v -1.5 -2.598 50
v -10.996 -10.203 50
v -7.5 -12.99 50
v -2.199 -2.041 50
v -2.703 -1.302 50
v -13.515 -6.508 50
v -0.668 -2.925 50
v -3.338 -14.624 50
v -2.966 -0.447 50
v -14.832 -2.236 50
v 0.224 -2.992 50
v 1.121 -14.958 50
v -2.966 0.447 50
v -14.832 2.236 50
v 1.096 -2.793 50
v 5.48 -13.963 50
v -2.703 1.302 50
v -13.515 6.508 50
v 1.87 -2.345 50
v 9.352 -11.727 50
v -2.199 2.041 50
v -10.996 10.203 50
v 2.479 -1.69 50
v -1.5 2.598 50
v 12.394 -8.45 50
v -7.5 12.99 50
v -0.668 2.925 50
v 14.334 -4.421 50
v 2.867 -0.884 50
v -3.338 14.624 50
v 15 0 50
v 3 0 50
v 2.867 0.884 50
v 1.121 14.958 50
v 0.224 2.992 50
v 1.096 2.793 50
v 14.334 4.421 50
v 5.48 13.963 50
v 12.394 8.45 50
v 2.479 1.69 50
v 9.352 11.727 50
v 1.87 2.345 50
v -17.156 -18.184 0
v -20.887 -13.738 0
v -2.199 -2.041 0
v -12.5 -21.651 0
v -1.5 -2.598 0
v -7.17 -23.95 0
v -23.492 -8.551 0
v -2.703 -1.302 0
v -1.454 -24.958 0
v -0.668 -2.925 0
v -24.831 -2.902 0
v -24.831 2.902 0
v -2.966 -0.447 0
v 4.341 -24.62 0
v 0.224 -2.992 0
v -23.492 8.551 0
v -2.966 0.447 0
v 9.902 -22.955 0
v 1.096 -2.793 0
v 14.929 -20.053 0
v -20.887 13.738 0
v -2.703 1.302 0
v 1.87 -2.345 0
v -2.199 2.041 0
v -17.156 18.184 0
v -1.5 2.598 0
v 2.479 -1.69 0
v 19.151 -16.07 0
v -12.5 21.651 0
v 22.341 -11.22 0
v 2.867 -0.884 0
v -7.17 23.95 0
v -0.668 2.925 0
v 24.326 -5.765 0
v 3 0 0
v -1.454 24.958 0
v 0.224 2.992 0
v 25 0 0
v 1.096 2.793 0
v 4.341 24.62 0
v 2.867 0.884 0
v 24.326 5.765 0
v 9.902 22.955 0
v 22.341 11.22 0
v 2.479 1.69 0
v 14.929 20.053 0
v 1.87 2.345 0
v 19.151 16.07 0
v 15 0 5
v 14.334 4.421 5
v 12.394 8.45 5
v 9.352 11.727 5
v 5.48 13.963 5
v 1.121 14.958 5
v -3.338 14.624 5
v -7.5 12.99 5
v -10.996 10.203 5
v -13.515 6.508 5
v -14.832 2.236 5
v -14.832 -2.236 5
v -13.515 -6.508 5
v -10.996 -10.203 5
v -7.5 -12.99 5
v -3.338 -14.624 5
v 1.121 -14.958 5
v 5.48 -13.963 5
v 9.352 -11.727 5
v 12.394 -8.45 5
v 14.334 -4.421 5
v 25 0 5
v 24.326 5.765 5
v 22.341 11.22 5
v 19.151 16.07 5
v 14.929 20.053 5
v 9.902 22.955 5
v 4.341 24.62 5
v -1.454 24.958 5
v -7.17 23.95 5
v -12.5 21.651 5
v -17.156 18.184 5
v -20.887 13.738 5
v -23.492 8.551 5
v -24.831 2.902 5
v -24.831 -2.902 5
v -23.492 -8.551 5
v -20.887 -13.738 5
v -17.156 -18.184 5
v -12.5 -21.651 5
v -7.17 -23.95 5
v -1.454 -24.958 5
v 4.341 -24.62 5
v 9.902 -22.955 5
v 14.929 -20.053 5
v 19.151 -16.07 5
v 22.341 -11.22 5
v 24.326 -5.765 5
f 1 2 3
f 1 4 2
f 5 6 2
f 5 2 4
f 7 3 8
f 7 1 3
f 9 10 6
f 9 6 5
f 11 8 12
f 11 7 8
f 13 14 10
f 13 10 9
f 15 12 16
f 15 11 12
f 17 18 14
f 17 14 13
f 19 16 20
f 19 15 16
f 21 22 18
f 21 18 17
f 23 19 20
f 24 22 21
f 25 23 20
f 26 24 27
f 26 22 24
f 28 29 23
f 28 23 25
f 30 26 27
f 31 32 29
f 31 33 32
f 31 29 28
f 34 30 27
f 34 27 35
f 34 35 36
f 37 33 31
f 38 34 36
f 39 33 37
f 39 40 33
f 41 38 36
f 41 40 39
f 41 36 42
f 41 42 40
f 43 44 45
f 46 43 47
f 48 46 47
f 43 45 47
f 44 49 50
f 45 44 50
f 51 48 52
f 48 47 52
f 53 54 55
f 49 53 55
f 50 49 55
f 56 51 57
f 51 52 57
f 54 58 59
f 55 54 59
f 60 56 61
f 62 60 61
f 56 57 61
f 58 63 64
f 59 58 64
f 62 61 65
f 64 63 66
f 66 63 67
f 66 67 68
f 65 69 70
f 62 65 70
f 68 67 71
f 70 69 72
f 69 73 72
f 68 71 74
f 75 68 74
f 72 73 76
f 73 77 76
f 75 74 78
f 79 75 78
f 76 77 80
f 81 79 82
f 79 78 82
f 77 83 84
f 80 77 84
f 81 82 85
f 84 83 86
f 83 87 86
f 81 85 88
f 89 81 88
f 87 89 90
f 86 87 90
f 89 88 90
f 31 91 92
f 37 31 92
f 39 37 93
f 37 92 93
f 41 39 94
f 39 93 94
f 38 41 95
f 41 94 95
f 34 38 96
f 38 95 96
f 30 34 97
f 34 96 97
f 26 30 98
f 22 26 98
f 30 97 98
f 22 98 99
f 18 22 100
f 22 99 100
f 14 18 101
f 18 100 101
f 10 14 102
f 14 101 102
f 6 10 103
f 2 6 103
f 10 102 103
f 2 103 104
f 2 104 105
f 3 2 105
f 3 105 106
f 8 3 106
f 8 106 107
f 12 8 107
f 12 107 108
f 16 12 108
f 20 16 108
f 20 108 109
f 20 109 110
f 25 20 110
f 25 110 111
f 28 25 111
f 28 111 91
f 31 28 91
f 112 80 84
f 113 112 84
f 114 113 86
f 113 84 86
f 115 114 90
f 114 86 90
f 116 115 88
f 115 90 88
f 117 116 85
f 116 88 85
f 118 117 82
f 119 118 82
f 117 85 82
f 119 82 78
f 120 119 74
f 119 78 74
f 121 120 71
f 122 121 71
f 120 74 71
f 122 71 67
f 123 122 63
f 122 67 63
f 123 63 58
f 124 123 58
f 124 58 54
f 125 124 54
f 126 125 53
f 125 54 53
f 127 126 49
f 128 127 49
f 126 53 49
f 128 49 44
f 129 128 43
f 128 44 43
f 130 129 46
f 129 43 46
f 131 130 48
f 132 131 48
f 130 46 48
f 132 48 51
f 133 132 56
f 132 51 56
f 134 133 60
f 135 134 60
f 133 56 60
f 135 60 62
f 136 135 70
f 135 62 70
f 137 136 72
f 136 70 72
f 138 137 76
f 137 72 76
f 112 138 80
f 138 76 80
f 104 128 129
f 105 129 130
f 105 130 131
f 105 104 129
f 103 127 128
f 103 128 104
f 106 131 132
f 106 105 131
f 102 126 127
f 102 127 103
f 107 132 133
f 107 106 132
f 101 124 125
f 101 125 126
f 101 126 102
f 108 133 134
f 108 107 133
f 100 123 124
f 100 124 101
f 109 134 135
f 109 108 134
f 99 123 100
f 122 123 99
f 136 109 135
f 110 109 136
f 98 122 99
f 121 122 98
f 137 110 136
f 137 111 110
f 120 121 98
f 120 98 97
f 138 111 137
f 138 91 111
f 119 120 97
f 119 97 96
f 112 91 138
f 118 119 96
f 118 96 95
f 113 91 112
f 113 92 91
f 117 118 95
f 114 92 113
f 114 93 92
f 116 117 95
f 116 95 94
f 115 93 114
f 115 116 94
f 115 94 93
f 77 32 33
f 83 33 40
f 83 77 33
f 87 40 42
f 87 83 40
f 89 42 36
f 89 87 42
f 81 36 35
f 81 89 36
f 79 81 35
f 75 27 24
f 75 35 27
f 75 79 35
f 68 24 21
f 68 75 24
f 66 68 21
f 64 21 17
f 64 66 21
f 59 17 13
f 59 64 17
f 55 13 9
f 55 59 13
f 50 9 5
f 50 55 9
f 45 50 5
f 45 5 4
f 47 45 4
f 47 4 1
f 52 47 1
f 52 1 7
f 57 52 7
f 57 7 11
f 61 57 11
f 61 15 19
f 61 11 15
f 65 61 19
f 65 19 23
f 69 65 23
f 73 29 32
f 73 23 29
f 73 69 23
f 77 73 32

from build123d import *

# Parameters (mm, degrees)
F0_R     = 15
F1_DEPTH = 50
F2_R     = 25
F3_DEPTH = 5
F4_R     = 3
F5_DEPTH = 60


with BuildPart() as f1:
    # F0 (on Top) → F1 (new body)
    with BuildSketch(Plane.XY):
        Circle(F0_R)
    extrude(amount=F1_DEPTH)

    # F2 (on Top) → F3 (join)
    with BuildSketch(Plane.XY):
        Circle(F2_R)
    extrude(amount=F3_DEPTH)


with BuildPart() as f5:
    # F4 (on Top) → F5 (new body)
    with BuildSketch(Plane.XY):
        Circle(F4_R)
    extrude(amount=F5_DEPTH)


with BuildPart() as f1_1:
    add(f1.part)

    # F6: cut F5
    add(f5.part, mode=Mode.SUBTRACT)


solid = f1_1.part
